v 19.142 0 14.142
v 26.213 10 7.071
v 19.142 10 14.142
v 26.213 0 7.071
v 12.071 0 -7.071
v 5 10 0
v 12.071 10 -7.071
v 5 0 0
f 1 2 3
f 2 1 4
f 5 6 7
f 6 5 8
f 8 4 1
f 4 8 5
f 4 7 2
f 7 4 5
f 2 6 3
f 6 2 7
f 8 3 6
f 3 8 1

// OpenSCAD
// Transformation example
translate([5, 0, 0])
    rotate([0, 45, 0])
        scale([1, 1, 2])
            cube([10, 10, 10]);
